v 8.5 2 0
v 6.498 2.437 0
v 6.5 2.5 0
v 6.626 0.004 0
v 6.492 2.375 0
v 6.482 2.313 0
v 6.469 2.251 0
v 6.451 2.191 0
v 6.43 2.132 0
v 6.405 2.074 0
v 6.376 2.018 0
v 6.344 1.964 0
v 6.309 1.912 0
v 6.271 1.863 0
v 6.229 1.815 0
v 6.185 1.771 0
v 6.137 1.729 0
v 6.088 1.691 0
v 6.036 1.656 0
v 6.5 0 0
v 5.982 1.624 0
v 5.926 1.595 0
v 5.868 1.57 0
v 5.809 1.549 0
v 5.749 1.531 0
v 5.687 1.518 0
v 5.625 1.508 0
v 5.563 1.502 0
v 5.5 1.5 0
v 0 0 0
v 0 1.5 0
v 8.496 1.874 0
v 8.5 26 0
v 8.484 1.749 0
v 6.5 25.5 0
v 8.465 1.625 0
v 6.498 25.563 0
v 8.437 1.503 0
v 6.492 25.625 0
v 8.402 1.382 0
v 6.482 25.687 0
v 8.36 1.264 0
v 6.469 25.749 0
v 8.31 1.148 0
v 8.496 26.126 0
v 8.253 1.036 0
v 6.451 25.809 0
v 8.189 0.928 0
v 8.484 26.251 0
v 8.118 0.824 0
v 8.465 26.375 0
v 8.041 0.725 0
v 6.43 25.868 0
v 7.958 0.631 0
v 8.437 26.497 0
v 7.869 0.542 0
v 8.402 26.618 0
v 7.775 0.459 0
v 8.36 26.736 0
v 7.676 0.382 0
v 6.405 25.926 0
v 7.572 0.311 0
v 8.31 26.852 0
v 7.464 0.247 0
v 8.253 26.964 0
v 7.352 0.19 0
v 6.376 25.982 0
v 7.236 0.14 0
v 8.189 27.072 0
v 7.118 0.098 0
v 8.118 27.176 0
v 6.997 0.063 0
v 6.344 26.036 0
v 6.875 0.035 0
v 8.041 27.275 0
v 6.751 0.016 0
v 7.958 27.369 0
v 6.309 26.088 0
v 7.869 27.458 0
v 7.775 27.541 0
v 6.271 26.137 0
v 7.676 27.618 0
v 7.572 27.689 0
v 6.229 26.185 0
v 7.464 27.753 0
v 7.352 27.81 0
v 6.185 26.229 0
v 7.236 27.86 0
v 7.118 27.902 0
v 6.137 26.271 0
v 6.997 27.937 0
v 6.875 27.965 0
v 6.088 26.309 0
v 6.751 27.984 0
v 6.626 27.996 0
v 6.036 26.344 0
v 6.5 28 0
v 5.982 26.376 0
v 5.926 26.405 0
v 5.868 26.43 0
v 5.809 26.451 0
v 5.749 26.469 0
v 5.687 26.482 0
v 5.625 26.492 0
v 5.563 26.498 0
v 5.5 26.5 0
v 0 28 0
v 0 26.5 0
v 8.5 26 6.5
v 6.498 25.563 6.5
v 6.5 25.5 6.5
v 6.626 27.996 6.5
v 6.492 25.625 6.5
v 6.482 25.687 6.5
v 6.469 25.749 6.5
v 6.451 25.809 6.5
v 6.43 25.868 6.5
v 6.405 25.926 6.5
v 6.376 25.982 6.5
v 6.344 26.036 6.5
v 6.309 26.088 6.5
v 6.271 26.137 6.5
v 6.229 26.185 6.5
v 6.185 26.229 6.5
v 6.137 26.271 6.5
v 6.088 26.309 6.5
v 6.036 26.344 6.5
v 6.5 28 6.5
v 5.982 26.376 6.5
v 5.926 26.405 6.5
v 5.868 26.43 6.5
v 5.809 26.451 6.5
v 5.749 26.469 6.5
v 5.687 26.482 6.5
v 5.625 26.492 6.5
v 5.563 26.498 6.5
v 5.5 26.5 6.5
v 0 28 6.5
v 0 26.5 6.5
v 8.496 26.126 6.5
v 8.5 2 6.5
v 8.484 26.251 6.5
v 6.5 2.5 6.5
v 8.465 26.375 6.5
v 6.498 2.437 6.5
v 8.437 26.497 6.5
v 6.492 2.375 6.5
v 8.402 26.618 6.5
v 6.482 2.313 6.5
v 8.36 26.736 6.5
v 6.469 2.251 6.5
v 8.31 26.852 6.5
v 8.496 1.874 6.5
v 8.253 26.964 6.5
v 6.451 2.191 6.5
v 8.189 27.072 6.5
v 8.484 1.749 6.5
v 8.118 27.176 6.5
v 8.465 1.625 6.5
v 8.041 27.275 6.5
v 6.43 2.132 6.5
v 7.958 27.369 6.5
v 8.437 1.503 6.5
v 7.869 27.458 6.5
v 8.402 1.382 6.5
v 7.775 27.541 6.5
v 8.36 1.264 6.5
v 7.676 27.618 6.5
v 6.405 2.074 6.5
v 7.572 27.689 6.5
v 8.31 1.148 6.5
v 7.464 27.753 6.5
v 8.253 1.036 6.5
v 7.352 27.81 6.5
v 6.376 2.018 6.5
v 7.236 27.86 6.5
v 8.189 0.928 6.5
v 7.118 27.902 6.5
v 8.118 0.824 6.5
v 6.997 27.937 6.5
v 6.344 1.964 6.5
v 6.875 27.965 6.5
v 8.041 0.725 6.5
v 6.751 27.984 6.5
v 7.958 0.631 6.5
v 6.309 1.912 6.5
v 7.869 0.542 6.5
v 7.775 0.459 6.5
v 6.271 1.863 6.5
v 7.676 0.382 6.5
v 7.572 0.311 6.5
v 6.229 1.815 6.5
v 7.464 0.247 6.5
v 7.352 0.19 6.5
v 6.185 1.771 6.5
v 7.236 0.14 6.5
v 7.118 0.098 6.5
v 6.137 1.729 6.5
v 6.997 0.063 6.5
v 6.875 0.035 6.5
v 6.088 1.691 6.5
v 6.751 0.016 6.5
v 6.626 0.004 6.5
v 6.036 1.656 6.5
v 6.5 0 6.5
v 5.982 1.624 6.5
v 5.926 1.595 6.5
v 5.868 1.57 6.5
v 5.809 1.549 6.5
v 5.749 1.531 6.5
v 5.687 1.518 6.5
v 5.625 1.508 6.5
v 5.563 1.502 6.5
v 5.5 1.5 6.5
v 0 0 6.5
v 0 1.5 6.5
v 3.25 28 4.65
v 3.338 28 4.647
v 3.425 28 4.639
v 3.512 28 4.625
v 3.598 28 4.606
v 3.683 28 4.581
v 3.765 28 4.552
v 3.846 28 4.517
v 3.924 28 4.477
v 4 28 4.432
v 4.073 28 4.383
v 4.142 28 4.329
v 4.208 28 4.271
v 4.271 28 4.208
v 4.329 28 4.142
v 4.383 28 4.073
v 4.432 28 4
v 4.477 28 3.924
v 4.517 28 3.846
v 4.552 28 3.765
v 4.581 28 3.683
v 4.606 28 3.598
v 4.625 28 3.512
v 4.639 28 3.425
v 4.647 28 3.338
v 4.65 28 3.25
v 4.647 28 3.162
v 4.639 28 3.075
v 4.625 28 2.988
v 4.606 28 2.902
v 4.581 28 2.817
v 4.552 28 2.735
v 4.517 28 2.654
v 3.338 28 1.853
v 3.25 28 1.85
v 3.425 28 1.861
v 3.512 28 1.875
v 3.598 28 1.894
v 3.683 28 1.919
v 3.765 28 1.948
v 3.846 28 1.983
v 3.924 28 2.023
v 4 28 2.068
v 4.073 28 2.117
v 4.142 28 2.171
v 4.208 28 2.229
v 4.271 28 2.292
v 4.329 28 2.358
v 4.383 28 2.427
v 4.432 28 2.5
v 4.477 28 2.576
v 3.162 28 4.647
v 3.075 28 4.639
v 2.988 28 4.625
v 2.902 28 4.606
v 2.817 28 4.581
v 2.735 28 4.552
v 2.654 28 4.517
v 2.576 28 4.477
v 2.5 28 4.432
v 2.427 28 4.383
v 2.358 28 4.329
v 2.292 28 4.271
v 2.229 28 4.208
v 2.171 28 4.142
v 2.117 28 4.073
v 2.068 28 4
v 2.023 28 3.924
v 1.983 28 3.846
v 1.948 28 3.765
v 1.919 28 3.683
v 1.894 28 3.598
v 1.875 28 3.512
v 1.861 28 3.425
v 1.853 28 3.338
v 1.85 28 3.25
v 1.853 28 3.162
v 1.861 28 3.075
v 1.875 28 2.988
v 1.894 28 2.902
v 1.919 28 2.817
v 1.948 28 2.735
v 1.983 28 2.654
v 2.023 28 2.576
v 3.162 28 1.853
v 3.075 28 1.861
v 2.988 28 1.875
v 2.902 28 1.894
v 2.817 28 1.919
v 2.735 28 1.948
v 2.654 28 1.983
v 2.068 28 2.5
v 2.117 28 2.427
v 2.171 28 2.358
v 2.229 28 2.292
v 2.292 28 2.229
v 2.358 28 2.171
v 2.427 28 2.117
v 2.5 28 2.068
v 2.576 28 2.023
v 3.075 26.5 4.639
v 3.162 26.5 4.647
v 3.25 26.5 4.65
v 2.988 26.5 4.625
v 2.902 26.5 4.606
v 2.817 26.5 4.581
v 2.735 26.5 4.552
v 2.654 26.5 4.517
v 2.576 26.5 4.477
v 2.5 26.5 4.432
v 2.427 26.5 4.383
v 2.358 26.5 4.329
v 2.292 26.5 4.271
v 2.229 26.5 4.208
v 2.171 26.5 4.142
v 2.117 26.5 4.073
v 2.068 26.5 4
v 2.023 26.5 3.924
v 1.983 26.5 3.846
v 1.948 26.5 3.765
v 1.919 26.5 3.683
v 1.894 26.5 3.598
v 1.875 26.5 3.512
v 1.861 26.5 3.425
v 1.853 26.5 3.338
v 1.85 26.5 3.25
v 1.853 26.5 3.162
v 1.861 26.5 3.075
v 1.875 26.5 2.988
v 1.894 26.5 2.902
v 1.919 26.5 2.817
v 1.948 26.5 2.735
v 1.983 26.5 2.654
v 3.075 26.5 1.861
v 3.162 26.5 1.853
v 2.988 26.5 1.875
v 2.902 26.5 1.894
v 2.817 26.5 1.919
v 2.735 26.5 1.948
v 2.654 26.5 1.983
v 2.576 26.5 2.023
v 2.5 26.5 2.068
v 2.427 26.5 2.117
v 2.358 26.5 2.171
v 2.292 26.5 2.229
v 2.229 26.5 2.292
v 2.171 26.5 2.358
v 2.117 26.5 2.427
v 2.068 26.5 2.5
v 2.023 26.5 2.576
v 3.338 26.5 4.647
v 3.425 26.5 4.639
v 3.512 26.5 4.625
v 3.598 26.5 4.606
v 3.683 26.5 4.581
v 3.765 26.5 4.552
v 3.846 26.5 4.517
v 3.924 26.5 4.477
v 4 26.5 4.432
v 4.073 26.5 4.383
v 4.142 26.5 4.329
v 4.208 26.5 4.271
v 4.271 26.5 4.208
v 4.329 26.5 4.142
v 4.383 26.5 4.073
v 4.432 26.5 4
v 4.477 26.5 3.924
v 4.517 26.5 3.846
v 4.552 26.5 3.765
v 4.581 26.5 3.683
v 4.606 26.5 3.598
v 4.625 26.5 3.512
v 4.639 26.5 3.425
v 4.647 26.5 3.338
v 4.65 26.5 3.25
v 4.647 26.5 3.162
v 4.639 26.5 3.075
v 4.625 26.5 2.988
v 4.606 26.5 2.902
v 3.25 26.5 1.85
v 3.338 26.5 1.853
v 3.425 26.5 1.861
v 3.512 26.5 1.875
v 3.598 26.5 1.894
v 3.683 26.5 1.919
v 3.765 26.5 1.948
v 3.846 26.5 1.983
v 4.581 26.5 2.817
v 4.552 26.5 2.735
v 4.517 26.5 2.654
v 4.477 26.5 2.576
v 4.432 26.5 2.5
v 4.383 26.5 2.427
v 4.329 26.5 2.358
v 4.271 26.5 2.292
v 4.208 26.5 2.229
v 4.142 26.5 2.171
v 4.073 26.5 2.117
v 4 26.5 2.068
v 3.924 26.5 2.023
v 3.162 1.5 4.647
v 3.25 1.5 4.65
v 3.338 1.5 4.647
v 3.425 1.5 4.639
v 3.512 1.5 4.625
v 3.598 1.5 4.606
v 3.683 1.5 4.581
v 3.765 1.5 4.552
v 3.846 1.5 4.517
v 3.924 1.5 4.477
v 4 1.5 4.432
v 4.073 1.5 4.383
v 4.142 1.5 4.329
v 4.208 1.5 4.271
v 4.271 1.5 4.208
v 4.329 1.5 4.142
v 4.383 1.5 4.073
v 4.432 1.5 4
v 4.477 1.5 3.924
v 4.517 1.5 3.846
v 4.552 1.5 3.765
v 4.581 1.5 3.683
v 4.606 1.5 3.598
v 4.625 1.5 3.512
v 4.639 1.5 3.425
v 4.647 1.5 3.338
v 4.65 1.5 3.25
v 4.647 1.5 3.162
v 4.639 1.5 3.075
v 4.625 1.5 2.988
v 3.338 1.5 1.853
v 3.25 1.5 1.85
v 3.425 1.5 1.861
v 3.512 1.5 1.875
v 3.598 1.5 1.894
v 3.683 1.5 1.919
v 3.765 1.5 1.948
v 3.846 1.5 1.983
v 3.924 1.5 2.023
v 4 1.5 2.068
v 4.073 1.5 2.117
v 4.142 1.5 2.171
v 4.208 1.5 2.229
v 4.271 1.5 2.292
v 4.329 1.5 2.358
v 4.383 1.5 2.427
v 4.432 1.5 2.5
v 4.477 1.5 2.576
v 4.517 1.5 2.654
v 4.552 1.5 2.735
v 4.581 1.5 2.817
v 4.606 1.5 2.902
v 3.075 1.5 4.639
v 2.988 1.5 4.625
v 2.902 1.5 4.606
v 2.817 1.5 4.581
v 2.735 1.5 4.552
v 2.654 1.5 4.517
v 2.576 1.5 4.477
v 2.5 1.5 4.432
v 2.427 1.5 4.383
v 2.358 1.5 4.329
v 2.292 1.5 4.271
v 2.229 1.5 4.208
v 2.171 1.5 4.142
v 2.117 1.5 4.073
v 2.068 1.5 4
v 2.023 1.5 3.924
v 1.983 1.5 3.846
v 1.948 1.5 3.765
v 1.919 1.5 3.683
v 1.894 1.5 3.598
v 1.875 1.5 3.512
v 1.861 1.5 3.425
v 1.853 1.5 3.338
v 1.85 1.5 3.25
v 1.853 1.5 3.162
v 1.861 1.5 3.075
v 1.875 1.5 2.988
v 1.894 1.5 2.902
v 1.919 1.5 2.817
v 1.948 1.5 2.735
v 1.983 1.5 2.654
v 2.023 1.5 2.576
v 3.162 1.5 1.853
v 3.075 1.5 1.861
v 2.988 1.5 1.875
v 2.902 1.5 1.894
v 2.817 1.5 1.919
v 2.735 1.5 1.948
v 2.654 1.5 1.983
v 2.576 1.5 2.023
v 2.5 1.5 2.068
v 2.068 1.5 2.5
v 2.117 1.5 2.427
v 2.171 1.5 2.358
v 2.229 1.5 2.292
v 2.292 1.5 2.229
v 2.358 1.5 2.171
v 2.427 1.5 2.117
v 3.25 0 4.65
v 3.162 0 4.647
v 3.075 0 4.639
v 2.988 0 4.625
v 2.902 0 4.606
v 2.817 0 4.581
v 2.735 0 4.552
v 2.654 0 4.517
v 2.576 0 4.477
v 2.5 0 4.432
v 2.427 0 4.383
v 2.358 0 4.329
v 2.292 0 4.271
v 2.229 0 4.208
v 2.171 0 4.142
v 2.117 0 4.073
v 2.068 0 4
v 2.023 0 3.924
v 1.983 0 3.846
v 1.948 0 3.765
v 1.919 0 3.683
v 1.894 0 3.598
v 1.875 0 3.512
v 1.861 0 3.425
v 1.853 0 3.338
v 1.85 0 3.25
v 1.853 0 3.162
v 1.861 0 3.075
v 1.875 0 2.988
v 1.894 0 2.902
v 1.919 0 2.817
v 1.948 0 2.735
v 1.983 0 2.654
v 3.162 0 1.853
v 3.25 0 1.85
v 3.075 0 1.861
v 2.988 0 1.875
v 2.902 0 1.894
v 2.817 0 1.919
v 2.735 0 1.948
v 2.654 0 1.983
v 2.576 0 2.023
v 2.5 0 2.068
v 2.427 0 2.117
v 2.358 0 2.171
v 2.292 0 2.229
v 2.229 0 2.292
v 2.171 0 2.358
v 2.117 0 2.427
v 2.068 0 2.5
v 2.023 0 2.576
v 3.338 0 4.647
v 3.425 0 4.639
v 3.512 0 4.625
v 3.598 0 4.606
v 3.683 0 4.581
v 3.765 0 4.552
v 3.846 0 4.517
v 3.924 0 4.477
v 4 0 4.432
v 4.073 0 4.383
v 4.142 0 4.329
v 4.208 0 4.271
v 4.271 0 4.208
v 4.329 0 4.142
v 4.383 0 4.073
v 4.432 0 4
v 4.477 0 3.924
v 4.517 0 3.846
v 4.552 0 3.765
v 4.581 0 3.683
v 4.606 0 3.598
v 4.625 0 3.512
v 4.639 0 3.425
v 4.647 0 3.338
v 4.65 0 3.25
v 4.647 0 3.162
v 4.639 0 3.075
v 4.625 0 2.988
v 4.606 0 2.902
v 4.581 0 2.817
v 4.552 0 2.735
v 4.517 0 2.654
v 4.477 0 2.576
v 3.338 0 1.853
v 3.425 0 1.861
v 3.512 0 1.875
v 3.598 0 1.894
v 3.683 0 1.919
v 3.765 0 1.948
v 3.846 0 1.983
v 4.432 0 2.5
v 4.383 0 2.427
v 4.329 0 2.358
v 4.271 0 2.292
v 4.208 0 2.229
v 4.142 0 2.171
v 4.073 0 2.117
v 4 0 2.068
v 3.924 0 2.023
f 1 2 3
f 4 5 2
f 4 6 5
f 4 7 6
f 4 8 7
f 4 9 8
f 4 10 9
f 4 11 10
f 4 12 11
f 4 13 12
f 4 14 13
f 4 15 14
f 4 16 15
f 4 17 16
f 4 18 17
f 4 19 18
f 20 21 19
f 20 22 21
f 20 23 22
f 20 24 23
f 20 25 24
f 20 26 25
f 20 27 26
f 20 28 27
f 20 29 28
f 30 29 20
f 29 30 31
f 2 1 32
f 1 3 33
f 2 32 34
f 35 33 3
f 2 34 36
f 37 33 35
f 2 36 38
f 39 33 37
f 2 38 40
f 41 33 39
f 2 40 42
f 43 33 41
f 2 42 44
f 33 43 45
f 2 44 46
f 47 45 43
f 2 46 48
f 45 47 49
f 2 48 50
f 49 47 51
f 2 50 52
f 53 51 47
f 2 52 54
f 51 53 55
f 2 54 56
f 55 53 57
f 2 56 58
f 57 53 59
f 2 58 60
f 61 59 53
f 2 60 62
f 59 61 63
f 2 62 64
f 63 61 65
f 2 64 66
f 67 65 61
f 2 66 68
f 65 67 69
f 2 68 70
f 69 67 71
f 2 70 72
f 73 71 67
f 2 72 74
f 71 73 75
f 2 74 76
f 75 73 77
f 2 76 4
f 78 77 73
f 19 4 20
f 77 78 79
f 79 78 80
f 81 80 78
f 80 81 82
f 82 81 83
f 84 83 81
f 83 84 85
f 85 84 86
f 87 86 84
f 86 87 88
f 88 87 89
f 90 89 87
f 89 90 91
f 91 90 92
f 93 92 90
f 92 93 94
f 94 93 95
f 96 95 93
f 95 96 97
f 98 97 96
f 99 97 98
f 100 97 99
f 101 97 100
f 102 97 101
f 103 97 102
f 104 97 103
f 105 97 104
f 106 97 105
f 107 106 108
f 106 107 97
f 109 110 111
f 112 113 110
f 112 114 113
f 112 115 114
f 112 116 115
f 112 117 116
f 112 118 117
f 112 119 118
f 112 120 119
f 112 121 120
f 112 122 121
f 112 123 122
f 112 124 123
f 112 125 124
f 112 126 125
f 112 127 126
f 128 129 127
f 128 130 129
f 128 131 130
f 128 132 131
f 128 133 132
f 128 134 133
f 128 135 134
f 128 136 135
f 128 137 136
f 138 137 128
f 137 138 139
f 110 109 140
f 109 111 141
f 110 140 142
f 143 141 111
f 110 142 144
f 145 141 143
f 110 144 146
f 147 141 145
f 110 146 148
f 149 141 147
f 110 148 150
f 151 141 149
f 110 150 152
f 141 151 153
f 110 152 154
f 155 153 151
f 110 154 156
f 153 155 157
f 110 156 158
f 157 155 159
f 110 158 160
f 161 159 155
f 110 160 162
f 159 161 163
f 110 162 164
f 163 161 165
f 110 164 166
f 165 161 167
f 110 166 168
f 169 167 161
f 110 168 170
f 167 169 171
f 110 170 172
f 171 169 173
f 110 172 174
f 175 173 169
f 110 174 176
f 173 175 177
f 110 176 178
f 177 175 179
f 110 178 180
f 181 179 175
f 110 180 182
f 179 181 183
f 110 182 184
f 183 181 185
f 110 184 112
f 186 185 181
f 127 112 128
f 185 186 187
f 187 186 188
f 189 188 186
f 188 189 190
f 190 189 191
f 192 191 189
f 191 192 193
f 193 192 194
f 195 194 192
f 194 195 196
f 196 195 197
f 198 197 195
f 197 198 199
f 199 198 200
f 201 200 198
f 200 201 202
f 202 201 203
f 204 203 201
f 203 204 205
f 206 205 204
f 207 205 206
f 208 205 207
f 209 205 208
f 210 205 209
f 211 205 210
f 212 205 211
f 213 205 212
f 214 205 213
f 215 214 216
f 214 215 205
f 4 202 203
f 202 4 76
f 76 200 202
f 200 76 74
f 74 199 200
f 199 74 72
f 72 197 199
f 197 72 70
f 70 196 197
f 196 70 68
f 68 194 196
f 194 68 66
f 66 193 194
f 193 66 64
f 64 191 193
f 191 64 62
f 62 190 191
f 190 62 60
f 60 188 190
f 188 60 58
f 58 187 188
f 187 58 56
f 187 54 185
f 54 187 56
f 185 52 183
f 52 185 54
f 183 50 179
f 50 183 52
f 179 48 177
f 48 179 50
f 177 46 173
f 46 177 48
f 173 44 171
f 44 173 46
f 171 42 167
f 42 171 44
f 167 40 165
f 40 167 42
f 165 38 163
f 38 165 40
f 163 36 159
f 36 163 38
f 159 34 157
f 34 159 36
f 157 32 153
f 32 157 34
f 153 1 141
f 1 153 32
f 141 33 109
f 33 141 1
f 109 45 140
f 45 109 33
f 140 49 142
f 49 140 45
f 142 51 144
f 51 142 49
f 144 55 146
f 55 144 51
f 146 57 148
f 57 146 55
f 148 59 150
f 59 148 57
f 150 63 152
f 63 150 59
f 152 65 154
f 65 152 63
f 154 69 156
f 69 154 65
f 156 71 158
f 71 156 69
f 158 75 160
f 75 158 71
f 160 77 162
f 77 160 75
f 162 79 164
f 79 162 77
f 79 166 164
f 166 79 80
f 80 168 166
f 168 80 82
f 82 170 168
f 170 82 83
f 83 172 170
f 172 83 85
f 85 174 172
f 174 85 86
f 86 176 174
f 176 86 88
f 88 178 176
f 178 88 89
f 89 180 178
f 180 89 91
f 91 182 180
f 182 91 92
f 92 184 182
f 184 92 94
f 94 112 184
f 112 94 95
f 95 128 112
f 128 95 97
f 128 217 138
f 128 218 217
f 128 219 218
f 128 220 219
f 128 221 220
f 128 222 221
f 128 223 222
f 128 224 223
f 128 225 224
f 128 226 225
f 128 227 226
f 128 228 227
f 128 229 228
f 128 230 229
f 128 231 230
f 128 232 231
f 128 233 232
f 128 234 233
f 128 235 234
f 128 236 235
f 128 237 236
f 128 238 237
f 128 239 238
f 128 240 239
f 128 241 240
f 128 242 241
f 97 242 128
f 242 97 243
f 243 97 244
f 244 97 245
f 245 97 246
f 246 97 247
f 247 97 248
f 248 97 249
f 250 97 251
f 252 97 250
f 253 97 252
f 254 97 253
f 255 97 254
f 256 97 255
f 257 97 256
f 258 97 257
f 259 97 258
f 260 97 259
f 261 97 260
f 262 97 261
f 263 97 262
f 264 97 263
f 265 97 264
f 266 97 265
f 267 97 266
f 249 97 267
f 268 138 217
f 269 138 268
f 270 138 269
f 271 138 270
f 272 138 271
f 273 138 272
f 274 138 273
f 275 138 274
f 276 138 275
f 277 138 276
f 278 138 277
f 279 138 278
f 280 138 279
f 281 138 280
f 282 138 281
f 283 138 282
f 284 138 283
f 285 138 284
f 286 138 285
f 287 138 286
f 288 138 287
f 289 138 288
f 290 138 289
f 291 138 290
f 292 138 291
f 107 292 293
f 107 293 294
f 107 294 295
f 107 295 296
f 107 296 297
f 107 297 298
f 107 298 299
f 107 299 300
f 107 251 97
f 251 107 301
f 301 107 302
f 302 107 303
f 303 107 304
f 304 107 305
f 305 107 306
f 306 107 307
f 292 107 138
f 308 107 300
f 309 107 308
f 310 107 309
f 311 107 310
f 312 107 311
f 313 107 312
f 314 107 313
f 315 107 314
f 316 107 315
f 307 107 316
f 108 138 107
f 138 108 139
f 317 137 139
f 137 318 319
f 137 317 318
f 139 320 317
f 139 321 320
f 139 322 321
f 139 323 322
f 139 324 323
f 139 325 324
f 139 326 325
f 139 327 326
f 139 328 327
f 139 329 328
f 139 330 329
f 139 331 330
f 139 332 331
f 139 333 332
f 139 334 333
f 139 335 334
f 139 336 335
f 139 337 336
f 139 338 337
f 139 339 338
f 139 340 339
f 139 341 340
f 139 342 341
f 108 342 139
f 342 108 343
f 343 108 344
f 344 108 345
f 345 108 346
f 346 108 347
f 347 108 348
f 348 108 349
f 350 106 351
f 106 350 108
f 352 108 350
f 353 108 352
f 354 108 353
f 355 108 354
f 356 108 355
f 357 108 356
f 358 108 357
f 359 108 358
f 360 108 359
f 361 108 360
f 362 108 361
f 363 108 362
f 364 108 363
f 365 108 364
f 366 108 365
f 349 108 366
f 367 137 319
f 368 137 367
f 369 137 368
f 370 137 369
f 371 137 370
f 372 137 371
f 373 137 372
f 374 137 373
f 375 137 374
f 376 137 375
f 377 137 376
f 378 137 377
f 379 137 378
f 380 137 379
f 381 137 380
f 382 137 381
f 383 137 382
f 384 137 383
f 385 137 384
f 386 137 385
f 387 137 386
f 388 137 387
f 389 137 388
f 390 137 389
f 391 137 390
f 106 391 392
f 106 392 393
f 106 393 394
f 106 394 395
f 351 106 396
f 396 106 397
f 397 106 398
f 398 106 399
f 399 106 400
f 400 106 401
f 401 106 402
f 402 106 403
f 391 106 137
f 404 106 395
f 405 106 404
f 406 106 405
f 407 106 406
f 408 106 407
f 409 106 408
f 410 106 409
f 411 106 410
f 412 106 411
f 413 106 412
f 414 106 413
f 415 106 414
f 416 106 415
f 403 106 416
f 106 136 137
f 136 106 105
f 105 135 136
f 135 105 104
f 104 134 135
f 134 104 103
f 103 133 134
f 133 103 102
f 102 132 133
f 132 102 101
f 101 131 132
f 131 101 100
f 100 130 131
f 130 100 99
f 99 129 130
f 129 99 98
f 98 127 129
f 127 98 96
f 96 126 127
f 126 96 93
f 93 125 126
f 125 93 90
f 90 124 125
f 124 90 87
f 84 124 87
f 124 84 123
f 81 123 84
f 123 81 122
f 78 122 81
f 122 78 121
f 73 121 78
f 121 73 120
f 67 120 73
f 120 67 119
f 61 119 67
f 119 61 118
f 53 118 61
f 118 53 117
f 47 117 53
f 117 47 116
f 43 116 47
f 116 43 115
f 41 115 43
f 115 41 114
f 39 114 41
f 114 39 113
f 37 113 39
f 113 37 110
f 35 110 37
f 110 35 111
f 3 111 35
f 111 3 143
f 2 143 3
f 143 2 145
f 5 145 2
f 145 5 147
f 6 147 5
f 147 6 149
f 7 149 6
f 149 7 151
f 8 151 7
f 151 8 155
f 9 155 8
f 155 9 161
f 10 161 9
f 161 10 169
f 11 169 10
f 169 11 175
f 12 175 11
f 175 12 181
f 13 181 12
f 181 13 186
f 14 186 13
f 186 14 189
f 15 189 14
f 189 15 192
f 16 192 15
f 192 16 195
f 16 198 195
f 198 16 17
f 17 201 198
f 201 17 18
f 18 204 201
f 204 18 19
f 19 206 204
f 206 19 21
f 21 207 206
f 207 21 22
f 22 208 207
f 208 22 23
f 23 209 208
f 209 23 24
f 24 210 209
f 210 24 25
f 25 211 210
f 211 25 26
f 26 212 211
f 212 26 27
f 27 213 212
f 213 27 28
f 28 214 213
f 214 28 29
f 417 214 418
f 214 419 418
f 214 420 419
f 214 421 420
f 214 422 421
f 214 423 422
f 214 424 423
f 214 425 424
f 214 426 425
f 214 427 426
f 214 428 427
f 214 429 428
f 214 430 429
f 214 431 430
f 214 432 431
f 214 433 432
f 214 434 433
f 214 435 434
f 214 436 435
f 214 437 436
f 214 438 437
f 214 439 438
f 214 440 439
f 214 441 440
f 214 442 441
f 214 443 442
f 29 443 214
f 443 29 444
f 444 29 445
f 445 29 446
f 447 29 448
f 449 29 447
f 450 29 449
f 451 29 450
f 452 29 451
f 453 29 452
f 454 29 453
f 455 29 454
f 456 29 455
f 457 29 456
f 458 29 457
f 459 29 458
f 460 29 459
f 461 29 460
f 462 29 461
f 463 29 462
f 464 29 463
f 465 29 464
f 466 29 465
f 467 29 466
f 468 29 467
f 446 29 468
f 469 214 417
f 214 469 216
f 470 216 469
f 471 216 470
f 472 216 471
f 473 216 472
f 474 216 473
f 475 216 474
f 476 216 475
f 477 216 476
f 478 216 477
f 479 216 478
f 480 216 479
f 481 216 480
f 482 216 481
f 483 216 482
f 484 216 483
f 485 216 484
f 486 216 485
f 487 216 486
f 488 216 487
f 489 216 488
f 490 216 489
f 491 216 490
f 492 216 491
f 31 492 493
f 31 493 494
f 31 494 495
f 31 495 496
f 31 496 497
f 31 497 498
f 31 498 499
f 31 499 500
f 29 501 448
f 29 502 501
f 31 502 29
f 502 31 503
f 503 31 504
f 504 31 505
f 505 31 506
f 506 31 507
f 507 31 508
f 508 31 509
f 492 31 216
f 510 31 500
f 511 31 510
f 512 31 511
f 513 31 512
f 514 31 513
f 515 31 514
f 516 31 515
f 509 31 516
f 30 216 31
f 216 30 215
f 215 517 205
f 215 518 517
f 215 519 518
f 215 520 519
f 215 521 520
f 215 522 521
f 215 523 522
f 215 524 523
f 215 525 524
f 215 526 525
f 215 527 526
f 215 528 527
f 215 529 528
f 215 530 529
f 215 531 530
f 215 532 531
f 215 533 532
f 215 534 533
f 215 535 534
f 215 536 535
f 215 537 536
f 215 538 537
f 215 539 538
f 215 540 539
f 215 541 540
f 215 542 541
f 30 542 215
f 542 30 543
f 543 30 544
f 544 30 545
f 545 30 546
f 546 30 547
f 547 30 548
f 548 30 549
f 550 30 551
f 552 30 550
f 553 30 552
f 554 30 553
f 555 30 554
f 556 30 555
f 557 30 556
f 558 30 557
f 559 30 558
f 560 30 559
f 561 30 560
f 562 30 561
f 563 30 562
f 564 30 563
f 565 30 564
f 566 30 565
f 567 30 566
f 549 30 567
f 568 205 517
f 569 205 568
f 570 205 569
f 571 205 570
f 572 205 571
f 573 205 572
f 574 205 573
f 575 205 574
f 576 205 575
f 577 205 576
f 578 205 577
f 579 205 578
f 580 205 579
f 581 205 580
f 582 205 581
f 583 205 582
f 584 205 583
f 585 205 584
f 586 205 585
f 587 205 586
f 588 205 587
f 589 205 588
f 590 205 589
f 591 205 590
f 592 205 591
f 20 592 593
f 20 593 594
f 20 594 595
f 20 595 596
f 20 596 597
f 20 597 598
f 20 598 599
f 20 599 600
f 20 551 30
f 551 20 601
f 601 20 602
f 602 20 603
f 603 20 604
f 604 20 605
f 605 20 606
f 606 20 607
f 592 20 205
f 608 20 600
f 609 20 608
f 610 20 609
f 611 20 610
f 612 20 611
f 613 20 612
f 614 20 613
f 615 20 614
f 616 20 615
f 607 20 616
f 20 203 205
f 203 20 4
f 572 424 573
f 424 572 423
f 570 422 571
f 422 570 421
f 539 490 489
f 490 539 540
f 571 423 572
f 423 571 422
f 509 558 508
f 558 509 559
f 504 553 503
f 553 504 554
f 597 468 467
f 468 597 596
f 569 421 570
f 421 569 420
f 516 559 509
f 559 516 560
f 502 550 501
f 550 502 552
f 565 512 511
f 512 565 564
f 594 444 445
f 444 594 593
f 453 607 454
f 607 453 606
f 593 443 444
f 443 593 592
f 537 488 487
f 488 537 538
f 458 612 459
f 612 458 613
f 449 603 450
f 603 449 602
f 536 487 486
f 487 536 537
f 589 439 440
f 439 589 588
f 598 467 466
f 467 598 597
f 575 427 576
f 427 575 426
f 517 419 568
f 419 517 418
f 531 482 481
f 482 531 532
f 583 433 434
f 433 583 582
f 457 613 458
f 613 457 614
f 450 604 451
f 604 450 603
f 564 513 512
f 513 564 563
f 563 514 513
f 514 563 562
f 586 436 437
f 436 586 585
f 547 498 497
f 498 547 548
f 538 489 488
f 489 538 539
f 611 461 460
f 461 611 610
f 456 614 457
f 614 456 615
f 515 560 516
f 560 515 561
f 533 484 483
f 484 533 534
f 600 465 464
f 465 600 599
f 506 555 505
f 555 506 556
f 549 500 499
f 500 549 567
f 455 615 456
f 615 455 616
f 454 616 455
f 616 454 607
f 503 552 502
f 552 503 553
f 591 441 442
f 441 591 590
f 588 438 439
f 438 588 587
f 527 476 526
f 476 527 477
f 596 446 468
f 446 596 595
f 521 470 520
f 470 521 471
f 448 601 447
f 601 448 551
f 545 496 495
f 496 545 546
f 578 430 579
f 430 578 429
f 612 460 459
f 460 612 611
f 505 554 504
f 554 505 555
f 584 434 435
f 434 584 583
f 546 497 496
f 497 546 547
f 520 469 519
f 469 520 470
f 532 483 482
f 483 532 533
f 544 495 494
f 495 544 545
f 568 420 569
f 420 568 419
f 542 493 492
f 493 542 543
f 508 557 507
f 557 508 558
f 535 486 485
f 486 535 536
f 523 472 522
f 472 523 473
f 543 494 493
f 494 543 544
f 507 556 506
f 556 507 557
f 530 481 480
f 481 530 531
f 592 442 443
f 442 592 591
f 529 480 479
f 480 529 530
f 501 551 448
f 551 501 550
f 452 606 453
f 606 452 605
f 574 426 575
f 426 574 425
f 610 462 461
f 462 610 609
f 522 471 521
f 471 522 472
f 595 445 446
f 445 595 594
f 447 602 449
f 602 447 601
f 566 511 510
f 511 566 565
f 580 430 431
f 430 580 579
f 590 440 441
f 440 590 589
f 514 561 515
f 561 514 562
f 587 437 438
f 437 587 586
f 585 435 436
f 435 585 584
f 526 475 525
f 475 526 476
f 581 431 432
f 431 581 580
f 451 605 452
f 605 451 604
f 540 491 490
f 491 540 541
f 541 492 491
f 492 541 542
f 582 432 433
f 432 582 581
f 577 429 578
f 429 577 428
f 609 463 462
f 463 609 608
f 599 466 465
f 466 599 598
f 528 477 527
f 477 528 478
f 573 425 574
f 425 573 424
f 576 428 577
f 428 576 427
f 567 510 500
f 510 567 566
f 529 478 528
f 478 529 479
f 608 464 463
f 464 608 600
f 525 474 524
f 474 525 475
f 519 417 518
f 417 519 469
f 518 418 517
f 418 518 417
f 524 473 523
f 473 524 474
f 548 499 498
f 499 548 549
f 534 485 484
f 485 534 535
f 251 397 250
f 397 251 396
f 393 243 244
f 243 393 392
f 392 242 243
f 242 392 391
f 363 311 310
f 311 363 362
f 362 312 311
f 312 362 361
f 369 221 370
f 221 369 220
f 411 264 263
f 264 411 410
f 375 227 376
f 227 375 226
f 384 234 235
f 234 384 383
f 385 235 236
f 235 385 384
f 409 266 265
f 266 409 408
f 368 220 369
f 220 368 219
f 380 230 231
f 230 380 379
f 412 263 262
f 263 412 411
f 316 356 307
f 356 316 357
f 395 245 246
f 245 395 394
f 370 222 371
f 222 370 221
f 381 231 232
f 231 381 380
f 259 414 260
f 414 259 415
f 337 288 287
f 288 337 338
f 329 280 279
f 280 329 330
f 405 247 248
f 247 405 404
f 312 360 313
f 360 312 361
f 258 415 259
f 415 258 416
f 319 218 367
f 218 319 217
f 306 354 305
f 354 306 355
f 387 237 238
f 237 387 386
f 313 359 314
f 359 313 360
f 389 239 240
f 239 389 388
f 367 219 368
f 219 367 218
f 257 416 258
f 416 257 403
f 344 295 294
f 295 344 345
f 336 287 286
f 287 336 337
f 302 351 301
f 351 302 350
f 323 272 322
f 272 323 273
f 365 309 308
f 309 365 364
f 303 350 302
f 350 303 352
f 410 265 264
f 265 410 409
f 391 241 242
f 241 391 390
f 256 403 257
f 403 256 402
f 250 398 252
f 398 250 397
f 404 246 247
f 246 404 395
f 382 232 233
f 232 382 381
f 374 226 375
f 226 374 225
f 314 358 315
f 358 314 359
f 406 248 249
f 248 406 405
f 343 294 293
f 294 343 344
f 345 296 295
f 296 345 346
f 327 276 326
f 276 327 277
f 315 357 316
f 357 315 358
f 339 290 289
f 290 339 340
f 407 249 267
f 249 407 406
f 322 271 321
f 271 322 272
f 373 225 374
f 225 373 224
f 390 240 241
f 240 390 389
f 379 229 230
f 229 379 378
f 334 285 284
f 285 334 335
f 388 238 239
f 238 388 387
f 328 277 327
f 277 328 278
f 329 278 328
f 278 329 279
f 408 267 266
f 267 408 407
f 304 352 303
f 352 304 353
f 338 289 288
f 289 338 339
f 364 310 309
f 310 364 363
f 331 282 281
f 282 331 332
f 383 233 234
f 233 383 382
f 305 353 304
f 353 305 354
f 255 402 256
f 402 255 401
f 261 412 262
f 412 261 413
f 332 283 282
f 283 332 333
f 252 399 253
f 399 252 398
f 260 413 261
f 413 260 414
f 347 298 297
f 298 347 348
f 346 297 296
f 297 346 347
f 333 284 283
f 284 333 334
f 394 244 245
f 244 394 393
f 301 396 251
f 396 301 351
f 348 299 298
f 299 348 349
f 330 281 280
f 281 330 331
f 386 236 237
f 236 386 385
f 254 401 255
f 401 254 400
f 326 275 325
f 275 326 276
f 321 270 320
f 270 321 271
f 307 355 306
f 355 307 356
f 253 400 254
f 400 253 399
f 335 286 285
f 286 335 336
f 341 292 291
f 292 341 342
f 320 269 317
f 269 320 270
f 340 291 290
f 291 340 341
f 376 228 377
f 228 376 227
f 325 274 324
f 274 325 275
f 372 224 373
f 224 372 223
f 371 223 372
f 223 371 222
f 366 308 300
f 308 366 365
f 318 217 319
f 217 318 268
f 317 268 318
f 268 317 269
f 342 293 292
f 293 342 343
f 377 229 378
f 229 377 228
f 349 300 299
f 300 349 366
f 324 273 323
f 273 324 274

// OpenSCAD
// 3D-Printable C-Shaped Corner Spacer Bracket
// Perfectly symmetric, 6.5x6.5mm Pads, 1.5mm Thickness, 25mm Gap, 2mm Wall

$fn = 100; // High resolution for smooth holes and fillets

// --- Key Dimensions ---
gap = 25;           // Gap between mounting surfaces
pad_len = 6.5;      // Pad length (X axis)
pad_w = 6.5;        // Pad width (Z axis, extruded thickness)
pad_t = 1.5;        // Pad thickness (Y axis)
wall = 2.0;         // Wall thickness
hole_d = 2.8;       // M2.5 screw clearance

r_out = 2.0;        // Outer corner rounding
r_in = 1.0;         // Inner corner rounding

// --- Derived Calculations ---
total_h = pad_t + gap + pad_t; // 28 mm total height
total_d = pad_len + wall;      // 8.5 mm total depth

// --- 3D Generation ---
difference() {
    // 1. Main Bracket Body (Generated lying flat for optimal printing)
    linear_extrude(height = pad_w) {
        difference() {
            // Outer Boundary
            hull() {
                // Front edges of the pads
                translate([0, 0]) square([0.1, pad_t]);
                translate([0, total_h - pad_t]) square([0.1, pad_t]);

                // Back outer rounded corners
                translate([total_d - r_out, r_out]) circle(r=r_out);
                translate([total_d - r_out, total_h - r_out]) circle(r=r_out);
            }

            // Inner Cutout
            hull() {
                // Open front section between the pads
                translate([-1, pad_t]) square([0.1, gap]);

                // Back inner rounded corners
                translate([pad_len - r_in, pad_t + r_in]) circle(r=r_in);
                translate([pad_len - r_in, total_h - pad_t - r_in]) circle(r=r_in);
            }
        }
    }

    // 2. Drill Bottom Pad Hole (Horizontal orientation)
    // Perfectly centered at 3.25mm from the edges
    translate([pad_len / 2, -1, pad_w / 2])
        rotate([-90, 0, 0])
        cylinder(h = pad_t + 2, d = hole_d);

    // 3. Drill Top Pad Hole (Horizontal orientation)
    // Perfectly centered at 3.25mm from the edges
    translate([pad_len / 2, total_h - pad_t - 1, pad_w / 2])
        rotate([-90, 0, 0])
        cylinder(h = pad_t + 2, d = hole_d);
}
